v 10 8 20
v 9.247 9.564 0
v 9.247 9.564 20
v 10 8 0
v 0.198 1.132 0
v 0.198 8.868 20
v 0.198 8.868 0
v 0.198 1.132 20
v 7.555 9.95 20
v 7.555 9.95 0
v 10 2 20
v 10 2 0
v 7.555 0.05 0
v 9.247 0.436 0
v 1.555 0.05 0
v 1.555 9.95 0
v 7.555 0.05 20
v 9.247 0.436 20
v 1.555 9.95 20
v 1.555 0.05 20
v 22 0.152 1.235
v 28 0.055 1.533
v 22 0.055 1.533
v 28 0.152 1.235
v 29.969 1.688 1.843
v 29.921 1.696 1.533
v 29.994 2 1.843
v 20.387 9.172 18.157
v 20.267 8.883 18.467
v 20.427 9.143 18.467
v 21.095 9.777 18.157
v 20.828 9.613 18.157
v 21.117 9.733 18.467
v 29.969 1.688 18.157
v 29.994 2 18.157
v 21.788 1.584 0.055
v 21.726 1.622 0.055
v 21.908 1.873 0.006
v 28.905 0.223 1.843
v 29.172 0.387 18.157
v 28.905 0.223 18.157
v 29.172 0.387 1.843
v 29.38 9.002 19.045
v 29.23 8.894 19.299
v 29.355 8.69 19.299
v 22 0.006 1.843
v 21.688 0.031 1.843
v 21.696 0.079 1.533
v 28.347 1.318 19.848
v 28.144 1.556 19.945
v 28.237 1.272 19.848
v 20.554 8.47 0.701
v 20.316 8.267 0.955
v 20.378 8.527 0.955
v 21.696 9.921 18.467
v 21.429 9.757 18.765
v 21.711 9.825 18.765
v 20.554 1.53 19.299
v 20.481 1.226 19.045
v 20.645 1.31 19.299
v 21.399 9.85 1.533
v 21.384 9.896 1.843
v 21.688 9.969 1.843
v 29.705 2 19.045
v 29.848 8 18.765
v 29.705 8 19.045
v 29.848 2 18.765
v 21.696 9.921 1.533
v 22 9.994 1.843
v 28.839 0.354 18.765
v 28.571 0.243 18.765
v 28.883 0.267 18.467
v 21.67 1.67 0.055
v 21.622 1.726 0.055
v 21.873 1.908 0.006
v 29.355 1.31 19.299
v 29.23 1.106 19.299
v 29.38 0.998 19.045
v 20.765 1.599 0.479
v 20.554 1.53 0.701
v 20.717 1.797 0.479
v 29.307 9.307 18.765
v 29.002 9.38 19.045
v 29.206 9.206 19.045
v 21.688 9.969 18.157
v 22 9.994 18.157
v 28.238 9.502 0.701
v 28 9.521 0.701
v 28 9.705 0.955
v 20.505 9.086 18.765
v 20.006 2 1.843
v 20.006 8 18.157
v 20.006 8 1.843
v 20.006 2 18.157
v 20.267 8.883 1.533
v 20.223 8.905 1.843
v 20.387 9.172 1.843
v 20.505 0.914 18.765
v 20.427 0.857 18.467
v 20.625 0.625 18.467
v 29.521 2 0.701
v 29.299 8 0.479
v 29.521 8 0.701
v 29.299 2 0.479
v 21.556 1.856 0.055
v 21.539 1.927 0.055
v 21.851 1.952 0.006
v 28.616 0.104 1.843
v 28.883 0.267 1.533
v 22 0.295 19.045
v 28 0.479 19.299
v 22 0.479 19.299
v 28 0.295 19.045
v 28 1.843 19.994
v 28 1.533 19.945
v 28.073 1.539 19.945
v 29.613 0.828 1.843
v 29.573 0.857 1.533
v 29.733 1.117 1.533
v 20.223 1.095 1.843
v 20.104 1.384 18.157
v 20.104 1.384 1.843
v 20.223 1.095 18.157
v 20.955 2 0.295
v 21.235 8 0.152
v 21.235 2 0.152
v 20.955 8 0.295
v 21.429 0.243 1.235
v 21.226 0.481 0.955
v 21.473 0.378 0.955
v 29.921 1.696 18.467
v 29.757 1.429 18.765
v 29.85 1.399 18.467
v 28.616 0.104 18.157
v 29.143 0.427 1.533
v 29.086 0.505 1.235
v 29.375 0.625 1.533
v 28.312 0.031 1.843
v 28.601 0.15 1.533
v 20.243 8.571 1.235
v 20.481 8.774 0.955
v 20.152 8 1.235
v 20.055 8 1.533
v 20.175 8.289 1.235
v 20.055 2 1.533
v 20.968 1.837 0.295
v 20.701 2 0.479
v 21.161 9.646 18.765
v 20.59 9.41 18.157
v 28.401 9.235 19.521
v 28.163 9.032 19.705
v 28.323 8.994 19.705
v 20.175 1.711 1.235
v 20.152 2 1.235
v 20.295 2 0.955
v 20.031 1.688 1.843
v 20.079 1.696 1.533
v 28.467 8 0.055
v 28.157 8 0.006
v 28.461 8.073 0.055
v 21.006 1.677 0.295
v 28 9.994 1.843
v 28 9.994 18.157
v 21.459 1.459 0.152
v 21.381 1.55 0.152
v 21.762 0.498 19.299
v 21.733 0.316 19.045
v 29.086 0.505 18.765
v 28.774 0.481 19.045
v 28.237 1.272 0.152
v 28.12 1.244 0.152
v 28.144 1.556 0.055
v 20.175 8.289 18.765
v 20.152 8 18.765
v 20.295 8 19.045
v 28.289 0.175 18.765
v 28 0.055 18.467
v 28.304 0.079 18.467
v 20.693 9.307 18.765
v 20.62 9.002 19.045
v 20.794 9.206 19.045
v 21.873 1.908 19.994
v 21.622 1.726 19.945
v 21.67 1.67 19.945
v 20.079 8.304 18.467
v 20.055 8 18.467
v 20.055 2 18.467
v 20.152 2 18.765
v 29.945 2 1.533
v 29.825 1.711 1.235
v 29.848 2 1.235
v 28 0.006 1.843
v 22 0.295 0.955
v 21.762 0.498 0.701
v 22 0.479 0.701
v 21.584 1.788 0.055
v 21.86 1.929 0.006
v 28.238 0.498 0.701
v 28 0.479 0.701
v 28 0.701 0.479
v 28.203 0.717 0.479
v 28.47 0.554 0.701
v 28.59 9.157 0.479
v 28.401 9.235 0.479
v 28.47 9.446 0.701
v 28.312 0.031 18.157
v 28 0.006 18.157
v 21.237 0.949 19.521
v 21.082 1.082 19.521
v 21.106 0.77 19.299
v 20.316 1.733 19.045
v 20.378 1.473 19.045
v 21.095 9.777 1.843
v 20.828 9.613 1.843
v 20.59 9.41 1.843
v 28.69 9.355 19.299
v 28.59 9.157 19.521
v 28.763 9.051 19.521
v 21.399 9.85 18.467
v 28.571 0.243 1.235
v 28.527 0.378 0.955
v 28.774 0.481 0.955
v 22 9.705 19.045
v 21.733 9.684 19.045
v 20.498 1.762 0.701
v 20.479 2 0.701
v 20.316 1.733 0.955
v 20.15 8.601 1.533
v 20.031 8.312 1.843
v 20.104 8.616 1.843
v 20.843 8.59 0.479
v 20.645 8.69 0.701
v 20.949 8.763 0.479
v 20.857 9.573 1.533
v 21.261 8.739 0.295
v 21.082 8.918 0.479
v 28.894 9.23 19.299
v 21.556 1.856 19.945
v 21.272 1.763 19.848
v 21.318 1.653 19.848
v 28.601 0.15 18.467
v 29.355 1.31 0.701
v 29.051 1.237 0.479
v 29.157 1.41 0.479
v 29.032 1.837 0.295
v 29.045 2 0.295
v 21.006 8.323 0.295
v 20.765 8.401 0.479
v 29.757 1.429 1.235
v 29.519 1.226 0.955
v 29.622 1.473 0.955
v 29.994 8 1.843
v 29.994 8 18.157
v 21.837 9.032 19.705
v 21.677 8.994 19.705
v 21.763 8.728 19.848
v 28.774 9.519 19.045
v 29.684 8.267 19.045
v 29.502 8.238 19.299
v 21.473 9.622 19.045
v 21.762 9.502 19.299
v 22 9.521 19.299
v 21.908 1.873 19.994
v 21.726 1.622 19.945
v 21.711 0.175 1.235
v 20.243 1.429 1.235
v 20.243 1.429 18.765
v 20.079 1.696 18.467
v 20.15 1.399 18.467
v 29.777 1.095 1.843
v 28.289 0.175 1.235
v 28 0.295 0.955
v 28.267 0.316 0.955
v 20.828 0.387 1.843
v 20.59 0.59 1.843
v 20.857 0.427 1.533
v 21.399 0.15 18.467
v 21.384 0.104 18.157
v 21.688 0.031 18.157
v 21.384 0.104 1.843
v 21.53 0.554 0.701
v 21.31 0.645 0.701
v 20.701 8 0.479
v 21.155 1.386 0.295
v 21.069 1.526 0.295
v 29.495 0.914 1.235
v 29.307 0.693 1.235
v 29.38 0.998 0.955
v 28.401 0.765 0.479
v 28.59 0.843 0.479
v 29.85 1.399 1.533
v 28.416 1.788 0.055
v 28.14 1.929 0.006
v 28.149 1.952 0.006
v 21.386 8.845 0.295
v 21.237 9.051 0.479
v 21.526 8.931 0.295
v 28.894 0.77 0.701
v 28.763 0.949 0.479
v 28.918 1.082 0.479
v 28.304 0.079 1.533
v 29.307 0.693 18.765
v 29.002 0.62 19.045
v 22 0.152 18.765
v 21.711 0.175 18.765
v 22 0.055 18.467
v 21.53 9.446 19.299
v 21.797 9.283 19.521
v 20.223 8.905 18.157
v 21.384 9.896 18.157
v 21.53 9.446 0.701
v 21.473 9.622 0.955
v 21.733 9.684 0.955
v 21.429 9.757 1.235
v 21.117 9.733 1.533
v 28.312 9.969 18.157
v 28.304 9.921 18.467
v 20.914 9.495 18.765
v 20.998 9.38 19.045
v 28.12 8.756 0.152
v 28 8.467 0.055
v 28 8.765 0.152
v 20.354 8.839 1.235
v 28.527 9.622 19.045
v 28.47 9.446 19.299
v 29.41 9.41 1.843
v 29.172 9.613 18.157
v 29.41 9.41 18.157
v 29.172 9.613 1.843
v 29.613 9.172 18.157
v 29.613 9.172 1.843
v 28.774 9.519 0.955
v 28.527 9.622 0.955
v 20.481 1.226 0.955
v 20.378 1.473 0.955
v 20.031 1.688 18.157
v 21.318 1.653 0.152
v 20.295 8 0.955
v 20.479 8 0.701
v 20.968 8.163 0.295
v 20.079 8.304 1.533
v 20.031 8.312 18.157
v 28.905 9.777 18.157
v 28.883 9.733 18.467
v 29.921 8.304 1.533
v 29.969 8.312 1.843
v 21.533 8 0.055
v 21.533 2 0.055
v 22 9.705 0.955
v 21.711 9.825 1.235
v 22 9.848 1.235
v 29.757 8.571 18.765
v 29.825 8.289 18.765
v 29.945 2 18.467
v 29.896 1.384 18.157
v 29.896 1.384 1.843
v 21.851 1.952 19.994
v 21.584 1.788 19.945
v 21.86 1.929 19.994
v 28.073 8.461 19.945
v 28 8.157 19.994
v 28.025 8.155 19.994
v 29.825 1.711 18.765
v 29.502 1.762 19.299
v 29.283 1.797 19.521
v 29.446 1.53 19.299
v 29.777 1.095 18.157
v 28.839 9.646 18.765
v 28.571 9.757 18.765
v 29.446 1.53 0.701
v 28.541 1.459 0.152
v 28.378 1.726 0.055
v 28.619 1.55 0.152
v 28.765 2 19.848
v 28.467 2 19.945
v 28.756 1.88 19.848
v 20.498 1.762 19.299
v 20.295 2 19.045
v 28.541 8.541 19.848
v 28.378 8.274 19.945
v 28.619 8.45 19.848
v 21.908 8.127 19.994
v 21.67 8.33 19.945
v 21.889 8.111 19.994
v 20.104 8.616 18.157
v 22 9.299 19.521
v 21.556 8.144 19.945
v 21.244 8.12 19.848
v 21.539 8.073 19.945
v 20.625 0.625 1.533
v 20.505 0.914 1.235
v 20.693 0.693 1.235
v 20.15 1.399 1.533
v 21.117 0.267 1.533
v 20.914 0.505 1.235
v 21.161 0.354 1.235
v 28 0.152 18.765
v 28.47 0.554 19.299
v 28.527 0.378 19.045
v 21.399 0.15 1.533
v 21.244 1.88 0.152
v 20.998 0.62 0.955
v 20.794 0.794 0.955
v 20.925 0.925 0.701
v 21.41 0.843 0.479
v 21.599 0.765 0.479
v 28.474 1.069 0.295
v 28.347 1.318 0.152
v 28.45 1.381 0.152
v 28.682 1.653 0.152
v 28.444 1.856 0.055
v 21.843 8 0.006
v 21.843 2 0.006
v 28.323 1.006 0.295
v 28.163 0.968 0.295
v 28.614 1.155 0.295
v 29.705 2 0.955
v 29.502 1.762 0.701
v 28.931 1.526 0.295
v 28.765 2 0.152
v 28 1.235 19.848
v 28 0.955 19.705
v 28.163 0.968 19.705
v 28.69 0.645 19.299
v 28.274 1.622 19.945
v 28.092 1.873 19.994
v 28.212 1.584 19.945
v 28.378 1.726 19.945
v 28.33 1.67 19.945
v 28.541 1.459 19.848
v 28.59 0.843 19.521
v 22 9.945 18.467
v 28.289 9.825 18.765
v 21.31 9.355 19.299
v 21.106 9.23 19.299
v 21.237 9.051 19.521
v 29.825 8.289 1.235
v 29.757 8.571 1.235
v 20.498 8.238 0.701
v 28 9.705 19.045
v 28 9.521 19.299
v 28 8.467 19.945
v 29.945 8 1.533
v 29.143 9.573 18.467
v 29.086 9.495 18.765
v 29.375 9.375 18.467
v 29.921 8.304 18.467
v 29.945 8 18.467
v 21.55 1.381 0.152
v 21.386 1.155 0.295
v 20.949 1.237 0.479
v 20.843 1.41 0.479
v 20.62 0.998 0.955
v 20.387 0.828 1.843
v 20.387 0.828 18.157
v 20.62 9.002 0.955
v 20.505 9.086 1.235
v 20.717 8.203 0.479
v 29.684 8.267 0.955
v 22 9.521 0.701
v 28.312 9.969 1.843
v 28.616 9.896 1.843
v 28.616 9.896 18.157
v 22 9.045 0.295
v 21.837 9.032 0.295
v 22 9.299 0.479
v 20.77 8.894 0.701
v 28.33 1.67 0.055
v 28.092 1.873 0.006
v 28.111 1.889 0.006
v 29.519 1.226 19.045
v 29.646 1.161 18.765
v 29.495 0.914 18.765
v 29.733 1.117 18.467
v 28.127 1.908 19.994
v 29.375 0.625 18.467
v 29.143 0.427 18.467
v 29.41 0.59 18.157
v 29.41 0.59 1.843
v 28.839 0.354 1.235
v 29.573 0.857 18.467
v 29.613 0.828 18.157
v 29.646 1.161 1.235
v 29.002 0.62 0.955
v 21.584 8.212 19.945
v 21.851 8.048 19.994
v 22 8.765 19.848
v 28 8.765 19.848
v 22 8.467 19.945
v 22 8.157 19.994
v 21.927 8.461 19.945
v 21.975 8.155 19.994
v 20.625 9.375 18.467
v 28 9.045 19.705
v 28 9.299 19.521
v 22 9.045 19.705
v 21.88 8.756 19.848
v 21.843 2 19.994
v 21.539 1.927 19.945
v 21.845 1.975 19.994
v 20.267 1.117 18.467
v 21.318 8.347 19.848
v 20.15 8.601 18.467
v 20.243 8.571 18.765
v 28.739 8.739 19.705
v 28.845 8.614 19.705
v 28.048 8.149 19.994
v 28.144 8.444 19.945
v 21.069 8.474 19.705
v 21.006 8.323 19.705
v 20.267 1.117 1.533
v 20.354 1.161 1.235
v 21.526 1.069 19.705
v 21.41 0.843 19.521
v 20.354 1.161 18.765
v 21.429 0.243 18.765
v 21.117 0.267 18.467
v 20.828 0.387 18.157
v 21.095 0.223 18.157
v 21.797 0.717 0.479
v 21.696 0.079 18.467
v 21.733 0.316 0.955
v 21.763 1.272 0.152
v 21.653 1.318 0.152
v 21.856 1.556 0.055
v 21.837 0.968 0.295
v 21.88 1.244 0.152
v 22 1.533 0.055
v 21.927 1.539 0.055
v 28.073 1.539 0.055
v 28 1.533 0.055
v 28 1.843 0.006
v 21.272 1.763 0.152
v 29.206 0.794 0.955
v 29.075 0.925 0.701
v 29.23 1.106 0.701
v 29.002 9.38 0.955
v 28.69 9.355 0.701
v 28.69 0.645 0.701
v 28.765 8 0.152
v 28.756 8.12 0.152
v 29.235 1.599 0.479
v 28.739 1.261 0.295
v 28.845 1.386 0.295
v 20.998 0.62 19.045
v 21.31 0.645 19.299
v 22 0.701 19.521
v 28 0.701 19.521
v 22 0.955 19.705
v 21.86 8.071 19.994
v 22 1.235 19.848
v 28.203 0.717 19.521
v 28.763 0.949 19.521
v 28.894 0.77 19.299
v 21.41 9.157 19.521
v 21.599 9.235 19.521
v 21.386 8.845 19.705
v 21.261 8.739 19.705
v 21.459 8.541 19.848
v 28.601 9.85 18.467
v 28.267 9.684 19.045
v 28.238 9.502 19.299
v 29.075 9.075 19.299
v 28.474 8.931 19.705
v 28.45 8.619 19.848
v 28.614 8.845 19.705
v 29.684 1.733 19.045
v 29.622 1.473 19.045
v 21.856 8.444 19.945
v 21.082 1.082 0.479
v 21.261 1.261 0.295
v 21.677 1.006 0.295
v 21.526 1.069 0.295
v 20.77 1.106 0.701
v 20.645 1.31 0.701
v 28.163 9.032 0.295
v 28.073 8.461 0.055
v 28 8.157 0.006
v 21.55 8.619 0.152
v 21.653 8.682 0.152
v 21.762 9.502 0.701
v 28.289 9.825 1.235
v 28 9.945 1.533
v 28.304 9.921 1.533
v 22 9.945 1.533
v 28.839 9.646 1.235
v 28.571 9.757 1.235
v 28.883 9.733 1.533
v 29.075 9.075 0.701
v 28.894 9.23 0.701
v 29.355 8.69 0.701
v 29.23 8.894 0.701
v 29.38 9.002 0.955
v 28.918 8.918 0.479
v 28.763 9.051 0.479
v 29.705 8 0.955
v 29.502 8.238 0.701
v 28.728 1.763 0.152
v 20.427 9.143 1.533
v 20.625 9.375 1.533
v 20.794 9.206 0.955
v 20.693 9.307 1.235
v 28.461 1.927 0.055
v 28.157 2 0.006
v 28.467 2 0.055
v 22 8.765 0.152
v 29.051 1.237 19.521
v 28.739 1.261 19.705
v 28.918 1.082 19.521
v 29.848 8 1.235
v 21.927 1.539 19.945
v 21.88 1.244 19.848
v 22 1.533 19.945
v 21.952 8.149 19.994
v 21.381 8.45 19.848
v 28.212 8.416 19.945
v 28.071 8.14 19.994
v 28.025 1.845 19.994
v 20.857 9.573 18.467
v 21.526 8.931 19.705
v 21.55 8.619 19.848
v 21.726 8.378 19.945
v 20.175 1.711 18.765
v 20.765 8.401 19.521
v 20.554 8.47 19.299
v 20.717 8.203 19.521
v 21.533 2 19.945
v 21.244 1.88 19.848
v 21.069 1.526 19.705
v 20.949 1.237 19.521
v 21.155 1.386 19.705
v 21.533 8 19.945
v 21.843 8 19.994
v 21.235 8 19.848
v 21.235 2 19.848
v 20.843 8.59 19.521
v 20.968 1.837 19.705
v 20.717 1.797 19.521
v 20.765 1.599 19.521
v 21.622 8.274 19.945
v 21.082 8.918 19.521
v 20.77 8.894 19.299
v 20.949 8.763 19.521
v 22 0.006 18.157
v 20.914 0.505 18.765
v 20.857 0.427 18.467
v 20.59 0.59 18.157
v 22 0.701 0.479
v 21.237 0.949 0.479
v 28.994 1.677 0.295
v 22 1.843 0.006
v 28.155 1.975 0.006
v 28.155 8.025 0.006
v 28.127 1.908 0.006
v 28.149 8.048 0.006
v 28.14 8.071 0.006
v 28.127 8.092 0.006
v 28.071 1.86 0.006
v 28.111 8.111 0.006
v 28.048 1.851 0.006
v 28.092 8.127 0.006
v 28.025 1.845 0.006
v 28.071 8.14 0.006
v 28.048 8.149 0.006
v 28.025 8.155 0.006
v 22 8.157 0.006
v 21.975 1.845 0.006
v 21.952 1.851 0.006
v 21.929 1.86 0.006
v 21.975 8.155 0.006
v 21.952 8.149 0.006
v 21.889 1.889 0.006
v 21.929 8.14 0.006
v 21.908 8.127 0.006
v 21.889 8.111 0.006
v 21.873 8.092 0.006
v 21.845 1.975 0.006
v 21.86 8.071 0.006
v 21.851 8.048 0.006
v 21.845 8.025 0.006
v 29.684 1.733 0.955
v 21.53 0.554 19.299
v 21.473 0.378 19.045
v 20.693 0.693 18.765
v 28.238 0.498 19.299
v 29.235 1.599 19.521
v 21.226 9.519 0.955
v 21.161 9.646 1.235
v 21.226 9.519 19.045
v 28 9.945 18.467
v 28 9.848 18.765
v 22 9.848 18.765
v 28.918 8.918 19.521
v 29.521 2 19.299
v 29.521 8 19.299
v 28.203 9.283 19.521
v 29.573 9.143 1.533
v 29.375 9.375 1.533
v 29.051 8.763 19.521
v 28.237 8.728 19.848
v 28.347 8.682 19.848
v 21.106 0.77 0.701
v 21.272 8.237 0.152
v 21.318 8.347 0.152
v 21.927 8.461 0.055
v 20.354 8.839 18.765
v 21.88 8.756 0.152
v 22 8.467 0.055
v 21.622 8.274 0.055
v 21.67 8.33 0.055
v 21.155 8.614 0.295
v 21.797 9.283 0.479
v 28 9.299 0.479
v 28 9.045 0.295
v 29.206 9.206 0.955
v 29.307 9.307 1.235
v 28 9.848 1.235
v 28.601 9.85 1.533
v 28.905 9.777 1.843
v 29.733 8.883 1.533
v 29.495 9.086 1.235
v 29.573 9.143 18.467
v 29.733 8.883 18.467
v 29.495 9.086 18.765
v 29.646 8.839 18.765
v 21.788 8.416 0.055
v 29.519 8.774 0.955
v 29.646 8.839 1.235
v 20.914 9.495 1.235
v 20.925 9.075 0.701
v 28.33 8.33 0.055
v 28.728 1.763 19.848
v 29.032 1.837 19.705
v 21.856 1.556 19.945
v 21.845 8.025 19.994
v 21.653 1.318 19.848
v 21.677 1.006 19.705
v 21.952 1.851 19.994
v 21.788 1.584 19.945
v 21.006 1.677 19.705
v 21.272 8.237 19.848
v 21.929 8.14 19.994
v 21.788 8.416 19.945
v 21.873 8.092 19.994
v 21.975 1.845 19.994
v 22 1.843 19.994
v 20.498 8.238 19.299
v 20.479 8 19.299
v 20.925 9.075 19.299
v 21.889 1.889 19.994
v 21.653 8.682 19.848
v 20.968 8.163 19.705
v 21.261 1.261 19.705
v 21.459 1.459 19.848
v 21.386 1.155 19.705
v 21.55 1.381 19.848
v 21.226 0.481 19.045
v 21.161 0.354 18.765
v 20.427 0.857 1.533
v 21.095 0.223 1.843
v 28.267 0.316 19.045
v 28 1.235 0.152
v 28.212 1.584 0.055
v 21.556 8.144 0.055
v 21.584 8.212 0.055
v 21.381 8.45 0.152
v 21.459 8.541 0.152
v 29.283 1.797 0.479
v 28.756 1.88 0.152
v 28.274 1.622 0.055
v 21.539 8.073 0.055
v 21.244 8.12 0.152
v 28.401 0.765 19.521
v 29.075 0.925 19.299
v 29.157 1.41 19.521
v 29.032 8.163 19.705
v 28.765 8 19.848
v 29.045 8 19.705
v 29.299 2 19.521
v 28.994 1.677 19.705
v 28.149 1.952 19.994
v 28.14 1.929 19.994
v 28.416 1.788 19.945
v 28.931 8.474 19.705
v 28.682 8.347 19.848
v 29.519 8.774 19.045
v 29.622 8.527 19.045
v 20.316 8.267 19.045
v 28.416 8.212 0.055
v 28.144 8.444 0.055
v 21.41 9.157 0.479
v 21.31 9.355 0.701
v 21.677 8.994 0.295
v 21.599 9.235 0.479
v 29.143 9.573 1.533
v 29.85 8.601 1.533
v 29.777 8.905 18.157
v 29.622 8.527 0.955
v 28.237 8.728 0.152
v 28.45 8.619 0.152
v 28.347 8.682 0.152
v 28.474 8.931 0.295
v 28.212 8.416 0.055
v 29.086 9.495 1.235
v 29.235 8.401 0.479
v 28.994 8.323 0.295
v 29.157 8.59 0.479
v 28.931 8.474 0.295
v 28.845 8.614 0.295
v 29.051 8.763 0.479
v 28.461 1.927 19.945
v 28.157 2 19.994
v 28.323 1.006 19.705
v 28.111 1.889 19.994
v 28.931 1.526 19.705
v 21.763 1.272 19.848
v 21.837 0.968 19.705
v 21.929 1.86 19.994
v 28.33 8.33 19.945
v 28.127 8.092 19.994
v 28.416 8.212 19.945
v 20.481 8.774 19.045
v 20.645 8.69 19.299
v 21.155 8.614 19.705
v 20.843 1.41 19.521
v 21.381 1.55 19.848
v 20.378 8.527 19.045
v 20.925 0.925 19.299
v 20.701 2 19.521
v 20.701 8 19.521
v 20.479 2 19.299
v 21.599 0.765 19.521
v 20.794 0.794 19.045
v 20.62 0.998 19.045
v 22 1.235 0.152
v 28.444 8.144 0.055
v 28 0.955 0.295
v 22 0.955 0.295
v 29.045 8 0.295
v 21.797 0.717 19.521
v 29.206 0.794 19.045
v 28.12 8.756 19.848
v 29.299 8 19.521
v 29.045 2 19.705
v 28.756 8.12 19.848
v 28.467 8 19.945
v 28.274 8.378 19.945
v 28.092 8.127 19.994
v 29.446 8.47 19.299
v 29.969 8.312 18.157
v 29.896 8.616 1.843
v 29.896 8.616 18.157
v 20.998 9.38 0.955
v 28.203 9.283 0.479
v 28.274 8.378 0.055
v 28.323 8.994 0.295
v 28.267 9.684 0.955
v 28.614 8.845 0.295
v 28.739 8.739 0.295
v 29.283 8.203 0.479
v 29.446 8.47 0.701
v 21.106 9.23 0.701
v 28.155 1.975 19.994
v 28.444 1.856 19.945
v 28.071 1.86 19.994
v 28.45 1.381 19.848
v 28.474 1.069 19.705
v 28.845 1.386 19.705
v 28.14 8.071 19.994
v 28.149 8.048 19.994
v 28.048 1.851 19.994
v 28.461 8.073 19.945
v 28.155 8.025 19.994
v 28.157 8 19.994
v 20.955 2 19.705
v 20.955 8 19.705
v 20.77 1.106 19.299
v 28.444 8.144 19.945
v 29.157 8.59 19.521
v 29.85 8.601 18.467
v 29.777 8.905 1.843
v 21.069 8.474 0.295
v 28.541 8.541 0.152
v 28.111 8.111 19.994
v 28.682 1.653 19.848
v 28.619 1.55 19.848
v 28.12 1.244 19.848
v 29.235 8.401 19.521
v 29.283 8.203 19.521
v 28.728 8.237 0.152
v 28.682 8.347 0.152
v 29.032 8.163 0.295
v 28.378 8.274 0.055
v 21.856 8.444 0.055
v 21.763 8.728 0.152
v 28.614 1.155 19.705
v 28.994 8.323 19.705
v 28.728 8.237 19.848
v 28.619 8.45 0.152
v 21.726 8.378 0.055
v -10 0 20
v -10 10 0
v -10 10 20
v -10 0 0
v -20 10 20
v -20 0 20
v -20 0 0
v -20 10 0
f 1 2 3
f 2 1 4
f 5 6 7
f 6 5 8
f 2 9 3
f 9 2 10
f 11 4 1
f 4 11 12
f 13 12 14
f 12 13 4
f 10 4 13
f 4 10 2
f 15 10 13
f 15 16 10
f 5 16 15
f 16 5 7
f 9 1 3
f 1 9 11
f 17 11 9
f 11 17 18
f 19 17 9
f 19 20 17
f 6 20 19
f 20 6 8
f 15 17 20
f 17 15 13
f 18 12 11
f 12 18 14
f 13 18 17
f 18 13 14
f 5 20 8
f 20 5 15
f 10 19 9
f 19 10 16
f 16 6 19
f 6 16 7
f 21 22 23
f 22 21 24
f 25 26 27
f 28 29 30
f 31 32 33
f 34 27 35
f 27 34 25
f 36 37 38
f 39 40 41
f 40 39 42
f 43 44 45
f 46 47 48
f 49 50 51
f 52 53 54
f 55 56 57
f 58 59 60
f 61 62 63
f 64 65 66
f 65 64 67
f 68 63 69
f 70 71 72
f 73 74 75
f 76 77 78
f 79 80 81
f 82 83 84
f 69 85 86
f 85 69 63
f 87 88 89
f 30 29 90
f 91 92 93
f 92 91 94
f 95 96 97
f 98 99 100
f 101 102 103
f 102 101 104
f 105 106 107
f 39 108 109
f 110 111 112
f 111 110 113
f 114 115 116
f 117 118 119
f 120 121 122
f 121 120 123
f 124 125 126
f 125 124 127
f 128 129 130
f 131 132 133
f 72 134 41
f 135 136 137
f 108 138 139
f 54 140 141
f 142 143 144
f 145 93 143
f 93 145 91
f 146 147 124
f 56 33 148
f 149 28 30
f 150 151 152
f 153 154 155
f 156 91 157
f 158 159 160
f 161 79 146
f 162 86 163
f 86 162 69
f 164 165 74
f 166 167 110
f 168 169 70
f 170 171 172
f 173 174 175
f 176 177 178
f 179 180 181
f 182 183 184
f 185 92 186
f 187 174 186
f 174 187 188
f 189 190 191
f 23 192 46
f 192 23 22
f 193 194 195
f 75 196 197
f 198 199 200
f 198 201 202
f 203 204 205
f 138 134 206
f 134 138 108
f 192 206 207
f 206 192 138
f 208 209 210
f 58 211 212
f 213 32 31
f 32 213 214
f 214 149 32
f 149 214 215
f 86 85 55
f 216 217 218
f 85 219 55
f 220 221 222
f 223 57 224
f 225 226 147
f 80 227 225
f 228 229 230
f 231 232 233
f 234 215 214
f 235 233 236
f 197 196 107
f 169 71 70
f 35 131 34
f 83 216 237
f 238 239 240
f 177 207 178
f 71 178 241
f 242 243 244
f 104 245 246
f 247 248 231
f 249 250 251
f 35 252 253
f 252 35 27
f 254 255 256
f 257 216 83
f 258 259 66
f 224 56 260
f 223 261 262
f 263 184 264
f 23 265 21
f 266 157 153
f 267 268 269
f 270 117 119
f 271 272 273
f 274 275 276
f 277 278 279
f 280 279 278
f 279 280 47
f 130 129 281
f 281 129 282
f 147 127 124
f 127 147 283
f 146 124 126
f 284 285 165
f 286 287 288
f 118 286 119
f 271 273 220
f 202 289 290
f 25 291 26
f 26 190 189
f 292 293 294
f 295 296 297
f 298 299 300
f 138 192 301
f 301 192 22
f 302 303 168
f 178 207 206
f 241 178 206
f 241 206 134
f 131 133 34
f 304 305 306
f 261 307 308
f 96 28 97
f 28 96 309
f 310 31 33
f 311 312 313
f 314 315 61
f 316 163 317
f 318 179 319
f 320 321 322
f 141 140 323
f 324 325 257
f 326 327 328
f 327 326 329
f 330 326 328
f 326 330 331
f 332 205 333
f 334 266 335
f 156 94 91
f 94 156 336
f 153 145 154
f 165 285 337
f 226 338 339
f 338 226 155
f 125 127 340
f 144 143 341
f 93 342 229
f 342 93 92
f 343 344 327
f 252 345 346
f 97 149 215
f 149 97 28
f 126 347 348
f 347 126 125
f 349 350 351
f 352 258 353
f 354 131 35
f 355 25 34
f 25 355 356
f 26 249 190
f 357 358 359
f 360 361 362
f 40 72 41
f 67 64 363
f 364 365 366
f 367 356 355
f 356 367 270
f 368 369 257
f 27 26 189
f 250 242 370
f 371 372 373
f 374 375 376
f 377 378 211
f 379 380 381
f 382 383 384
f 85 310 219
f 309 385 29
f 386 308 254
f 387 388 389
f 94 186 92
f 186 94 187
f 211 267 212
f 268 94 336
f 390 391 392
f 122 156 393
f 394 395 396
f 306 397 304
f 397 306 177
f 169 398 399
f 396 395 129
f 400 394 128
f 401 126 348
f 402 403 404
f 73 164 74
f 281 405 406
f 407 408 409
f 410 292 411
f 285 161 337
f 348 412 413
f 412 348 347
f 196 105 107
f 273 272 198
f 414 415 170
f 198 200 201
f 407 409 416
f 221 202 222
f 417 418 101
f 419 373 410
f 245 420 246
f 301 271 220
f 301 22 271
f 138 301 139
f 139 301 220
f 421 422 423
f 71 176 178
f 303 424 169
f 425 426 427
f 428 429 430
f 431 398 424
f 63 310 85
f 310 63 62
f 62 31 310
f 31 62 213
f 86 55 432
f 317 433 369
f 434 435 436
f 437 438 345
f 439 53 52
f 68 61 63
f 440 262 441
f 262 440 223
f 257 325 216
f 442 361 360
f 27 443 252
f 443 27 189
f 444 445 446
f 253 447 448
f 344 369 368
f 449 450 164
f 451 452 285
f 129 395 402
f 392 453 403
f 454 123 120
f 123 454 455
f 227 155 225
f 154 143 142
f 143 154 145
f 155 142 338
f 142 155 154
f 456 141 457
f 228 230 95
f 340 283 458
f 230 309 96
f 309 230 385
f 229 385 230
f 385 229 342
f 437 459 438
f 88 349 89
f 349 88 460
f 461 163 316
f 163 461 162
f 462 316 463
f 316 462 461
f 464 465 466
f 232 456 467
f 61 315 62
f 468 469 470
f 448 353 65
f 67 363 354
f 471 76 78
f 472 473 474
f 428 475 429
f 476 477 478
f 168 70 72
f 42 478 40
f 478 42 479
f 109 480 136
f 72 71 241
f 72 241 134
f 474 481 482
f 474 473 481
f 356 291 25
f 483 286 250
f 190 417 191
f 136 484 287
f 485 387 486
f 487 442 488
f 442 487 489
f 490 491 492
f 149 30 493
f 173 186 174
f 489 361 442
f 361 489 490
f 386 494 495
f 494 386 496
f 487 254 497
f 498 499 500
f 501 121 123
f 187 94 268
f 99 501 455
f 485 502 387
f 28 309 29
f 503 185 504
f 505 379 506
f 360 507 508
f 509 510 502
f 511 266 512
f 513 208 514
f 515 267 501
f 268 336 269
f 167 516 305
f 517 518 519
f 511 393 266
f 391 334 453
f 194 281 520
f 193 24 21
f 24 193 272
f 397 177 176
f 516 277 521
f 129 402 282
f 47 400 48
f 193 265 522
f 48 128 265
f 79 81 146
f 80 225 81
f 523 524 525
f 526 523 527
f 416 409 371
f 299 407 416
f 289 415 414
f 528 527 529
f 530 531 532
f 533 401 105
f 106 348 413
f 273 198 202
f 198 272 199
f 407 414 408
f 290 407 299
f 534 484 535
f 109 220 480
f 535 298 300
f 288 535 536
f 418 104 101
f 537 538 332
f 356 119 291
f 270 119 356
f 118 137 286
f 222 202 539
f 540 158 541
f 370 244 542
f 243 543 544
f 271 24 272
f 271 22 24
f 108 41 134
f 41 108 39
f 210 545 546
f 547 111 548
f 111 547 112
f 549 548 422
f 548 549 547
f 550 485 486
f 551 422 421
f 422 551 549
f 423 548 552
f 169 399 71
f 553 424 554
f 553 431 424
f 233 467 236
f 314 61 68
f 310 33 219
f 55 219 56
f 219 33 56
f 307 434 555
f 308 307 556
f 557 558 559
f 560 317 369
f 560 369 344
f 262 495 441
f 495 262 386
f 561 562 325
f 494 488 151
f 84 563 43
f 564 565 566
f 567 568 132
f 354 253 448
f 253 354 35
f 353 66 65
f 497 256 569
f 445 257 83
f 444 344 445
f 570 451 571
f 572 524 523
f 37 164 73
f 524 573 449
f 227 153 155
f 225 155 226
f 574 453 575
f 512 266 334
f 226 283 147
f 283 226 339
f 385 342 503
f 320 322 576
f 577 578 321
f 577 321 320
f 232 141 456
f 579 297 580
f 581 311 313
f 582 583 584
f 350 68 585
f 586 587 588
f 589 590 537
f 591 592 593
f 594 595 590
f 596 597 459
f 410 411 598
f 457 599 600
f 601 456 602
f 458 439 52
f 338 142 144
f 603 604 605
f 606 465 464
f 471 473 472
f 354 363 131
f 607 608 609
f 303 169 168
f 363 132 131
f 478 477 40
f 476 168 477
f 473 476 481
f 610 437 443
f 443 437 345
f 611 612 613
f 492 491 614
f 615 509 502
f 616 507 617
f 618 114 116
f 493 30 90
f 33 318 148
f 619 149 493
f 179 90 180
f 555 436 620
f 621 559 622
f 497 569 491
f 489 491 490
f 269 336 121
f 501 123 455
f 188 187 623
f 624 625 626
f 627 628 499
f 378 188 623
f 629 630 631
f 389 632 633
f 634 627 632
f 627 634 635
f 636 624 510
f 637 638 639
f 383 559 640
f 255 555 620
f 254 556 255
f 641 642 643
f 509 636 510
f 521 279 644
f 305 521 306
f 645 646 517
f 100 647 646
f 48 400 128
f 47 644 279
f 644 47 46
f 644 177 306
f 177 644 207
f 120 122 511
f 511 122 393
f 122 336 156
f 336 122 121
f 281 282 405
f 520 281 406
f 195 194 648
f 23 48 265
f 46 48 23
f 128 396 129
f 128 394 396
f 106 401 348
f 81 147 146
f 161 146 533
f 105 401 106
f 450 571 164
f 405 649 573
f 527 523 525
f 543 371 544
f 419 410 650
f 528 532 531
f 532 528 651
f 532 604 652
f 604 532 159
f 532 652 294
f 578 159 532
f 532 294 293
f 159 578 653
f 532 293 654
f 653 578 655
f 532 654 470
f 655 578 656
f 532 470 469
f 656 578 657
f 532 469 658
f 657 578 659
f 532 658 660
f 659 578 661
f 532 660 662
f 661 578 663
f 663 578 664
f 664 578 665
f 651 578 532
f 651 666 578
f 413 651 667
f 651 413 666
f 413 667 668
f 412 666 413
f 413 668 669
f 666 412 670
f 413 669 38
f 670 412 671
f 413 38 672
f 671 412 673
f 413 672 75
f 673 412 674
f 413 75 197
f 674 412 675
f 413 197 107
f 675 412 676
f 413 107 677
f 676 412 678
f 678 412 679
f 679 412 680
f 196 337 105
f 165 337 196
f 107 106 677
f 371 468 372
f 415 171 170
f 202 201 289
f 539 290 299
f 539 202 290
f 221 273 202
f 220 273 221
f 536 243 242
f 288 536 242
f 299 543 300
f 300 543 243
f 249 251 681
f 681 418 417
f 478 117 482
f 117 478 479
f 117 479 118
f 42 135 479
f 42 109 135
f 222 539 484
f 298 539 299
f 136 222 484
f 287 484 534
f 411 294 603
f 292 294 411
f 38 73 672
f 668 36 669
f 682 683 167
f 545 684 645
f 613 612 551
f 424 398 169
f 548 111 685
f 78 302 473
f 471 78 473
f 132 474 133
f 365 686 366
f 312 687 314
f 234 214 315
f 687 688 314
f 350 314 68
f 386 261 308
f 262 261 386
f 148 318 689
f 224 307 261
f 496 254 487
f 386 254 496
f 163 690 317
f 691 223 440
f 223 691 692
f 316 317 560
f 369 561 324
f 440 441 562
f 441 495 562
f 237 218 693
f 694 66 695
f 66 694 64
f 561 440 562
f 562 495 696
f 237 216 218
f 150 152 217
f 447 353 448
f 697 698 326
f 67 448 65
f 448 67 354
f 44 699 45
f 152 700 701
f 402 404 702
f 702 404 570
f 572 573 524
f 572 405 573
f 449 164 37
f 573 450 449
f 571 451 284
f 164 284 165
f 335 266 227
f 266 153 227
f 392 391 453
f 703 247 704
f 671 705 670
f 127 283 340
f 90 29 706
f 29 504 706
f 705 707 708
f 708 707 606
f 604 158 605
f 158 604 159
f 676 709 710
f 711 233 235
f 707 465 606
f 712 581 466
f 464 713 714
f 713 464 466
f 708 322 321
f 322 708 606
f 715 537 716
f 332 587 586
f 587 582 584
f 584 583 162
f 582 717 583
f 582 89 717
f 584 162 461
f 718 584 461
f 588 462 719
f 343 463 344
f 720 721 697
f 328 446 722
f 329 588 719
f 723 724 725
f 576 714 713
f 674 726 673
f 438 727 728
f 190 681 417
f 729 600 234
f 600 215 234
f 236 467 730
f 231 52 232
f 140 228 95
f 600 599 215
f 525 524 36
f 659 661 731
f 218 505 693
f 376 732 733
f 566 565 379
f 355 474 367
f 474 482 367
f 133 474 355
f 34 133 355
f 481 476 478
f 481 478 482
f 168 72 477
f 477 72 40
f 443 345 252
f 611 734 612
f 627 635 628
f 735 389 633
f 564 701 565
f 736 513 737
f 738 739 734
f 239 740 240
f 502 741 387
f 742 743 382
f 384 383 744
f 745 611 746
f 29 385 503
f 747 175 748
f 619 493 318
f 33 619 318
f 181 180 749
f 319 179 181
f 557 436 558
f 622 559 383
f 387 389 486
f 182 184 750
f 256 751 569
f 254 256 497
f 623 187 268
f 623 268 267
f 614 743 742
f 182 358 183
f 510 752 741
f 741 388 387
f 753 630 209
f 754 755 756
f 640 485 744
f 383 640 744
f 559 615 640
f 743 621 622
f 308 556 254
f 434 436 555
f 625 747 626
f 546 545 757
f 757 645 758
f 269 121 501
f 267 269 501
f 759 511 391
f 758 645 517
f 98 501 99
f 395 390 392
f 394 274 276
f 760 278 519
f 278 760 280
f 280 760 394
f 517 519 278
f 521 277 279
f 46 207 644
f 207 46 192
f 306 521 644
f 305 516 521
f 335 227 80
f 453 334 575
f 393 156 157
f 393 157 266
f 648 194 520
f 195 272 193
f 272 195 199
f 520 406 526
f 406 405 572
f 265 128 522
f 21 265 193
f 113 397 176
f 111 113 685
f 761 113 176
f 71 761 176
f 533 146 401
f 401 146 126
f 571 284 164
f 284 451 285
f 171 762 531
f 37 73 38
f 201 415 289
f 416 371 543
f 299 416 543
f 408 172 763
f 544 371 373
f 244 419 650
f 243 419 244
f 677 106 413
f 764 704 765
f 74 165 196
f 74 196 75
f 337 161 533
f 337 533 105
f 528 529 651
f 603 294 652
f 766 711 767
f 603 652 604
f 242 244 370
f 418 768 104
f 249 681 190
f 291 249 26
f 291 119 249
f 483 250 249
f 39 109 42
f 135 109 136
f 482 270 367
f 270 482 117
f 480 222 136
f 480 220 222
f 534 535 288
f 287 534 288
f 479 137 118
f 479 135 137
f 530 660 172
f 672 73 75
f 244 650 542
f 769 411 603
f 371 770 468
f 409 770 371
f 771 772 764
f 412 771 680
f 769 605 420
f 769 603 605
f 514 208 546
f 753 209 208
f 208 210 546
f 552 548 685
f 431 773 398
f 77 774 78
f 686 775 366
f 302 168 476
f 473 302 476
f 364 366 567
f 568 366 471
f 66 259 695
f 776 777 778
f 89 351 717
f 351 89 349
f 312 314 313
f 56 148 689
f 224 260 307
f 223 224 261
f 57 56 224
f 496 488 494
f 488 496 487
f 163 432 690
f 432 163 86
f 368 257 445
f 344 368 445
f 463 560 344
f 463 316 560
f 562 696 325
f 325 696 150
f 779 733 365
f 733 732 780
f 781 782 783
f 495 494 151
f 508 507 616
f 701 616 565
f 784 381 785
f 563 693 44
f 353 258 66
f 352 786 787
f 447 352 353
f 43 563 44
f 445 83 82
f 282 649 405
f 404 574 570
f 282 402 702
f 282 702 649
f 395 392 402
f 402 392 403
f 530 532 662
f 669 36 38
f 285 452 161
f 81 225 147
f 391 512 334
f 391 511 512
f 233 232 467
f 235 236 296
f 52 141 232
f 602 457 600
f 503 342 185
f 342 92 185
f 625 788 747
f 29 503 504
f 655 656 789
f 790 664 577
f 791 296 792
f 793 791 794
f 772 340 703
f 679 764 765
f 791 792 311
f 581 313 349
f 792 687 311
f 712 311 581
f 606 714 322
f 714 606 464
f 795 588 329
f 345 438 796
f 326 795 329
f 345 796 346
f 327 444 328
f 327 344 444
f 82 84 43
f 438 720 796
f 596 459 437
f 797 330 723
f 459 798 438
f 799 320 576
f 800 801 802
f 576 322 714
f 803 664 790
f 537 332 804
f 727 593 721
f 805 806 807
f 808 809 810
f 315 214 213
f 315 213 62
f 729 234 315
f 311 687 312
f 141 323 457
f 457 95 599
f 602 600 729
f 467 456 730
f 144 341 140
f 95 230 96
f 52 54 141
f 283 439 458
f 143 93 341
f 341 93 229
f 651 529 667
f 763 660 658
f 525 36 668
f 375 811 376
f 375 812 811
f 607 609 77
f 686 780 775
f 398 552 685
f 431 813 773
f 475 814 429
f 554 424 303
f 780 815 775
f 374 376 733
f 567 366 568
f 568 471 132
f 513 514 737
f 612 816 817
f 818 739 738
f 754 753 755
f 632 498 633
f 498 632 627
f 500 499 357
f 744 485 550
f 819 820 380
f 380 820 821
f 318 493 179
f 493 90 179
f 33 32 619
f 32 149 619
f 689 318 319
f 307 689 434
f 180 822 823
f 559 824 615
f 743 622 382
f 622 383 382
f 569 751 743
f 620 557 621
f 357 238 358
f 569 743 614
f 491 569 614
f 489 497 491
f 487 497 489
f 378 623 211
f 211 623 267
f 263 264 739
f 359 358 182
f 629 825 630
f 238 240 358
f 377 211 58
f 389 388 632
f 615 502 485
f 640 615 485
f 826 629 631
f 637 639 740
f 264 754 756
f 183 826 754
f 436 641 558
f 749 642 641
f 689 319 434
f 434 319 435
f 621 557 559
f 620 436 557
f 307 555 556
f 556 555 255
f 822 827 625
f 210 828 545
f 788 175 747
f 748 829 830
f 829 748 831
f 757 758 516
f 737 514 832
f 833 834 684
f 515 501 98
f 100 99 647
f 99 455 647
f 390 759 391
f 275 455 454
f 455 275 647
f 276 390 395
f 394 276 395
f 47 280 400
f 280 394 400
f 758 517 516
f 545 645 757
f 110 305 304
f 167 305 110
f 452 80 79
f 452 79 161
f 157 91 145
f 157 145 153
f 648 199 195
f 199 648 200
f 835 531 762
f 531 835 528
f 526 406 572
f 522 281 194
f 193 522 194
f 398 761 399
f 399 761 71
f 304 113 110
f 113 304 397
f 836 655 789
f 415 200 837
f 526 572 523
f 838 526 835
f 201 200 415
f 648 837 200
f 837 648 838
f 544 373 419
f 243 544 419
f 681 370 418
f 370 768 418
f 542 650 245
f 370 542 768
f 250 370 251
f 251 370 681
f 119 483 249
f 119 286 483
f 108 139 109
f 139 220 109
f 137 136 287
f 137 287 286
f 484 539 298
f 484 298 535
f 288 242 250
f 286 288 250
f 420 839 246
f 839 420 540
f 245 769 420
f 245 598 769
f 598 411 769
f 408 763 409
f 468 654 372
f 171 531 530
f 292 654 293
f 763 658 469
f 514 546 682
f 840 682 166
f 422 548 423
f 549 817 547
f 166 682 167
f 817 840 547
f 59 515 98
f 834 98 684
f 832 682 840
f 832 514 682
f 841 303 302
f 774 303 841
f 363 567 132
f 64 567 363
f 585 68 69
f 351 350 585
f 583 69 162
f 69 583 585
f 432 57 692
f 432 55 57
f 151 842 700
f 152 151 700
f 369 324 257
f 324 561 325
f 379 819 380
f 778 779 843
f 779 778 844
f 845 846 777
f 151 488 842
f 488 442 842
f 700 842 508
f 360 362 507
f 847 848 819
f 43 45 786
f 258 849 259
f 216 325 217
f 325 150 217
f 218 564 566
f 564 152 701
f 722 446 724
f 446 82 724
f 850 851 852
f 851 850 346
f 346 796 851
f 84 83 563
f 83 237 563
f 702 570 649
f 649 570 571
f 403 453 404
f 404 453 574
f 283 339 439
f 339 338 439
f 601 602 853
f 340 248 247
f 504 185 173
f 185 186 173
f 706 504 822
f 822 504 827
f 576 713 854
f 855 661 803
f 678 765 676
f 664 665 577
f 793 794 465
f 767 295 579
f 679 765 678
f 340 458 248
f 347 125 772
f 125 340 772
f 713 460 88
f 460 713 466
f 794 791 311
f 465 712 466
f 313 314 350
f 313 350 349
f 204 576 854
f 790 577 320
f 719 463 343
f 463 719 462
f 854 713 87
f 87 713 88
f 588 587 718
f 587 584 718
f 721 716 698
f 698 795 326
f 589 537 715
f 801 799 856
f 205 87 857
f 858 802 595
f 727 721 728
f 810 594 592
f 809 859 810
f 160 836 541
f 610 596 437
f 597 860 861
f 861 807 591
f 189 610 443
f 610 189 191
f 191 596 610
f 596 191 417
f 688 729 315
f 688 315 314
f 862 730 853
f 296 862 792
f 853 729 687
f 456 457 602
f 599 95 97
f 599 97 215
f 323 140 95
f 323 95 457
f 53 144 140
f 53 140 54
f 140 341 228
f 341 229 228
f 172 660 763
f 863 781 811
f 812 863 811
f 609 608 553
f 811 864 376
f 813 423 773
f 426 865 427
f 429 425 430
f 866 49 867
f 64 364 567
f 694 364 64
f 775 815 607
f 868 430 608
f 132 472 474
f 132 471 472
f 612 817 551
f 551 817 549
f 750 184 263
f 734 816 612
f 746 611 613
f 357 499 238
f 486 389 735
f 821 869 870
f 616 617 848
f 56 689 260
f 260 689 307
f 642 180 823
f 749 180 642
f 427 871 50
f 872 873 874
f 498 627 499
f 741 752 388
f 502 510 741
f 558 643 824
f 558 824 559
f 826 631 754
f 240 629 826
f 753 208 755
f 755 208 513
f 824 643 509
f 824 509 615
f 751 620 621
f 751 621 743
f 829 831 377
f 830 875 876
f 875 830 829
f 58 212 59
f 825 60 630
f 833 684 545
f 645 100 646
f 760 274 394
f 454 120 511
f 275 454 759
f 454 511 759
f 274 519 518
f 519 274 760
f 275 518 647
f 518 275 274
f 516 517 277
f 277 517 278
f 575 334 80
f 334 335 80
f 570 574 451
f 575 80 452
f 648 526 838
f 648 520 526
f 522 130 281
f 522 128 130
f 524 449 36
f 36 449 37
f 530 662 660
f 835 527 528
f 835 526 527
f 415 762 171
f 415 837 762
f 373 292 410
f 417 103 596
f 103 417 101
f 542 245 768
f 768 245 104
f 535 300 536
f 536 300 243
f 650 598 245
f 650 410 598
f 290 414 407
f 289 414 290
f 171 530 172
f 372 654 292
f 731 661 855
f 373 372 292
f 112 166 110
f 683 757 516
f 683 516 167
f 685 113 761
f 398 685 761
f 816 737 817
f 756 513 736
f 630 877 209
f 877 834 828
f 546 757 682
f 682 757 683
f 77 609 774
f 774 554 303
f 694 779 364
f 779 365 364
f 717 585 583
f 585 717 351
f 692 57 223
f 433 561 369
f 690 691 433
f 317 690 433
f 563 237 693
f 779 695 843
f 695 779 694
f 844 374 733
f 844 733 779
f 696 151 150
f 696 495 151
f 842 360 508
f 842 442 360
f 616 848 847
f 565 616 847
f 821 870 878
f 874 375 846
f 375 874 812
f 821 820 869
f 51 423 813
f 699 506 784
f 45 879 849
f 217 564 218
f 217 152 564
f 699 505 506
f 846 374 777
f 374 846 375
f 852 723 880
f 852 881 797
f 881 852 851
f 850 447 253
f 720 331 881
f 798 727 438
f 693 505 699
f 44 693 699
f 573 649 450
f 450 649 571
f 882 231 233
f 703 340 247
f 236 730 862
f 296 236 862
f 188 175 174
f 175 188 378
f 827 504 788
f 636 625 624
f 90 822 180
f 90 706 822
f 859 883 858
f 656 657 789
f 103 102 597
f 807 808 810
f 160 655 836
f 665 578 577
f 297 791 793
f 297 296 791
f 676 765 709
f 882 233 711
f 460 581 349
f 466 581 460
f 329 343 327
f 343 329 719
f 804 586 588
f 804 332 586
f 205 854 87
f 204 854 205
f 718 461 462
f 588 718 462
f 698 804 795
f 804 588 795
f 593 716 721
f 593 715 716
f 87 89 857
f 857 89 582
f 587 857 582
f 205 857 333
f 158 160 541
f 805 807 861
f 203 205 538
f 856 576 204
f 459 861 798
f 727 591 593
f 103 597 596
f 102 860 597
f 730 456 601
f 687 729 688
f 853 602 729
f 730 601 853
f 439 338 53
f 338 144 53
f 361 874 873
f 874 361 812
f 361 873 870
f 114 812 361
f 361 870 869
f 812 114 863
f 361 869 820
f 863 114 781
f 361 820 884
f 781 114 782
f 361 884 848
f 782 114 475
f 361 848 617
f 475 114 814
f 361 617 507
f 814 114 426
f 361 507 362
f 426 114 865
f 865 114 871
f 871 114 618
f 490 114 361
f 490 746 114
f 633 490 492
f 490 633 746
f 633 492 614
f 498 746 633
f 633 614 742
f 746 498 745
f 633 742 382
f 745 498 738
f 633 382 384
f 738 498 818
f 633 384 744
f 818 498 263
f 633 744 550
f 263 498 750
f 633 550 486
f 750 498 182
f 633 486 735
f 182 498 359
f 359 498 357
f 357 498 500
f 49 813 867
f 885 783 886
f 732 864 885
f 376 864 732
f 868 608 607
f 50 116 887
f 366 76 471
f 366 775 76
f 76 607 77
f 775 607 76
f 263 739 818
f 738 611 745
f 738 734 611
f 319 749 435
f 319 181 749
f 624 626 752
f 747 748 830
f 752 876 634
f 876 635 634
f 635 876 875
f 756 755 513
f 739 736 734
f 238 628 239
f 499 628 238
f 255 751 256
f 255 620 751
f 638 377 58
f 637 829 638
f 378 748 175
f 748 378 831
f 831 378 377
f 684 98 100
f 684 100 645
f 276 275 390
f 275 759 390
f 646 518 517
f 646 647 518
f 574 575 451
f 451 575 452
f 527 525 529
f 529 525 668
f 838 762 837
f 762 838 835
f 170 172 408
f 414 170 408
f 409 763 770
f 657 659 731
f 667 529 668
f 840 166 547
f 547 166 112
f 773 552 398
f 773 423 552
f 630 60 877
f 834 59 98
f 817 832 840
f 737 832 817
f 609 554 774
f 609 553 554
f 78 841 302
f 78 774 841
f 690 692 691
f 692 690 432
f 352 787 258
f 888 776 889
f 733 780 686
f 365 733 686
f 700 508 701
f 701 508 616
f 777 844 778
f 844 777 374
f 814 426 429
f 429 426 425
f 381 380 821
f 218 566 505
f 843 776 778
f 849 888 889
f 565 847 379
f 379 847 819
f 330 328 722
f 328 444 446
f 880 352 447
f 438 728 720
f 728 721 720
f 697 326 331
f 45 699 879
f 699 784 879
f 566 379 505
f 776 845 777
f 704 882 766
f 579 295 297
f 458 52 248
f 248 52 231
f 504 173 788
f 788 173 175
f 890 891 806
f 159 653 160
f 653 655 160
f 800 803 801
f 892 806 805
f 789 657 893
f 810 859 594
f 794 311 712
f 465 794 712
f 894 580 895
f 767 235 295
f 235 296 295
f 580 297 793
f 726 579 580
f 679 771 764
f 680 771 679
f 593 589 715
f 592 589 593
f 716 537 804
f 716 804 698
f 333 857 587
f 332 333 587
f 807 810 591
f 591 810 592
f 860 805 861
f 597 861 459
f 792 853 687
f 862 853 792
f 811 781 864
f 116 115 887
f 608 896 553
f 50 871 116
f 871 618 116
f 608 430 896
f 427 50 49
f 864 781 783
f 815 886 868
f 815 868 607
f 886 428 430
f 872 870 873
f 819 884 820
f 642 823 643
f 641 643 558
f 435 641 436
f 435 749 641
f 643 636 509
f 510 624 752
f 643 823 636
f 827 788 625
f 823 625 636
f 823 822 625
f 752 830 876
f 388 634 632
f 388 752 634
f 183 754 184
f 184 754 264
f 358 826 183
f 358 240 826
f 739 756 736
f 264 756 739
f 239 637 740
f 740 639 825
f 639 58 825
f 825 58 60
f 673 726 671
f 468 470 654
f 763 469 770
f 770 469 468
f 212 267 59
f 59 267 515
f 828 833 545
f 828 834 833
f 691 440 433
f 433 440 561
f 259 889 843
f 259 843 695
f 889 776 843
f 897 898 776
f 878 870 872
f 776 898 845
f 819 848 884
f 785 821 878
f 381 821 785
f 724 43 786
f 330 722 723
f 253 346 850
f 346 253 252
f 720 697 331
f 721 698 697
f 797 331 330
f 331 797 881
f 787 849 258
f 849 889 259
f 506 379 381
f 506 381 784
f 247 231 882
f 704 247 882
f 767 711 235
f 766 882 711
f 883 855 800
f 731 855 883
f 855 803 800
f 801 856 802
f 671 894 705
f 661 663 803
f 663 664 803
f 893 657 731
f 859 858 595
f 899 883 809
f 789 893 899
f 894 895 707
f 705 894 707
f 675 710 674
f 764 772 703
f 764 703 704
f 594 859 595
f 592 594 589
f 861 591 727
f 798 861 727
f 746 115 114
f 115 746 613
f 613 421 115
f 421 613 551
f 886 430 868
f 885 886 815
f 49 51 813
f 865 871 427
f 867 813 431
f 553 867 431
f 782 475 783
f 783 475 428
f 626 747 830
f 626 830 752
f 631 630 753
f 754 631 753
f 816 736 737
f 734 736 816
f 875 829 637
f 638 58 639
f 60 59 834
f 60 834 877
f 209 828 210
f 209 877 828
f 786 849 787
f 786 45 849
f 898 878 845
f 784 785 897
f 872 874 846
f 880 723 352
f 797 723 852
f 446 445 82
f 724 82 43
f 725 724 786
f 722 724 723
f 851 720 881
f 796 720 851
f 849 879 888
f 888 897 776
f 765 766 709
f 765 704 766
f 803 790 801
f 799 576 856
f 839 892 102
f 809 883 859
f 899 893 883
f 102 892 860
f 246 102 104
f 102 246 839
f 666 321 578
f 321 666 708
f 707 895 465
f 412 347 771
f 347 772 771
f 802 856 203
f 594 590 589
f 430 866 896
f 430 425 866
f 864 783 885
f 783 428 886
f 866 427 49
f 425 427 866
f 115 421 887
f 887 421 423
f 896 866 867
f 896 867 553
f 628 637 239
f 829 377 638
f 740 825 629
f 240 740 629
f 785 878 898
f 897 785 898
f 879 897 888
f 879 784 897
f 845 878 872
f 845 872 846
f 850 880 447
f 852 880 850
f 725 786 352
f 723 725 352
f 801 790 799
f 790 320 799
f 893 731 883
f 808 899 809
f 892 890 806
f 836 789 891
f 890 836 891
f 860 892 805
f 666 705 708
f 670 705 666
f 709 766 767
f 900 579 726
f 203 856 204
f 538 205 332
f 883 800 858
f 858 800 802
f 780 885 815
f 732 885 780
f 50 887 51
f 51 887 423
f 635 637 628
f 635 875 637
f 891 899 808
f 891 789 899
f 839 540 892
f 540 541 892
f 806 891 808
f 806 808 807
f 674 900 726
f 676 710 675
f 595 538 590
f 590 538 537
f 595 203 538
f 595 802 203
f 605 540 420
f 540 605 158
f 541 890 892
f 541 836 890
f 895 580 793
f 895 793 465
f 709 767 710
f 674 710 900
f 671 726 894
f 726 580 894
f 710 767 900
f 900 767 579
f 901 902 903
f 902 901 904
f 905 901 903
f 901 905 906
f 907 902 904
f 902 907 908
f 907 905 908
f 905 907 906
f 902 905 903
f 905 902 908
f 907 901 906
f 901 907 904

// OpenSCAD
// file: params.scad
module roundedRect(size, radius)
    {
    x = size[0];
    y = size[1];
    z = size[2];

    linear_extrude(height=z)
    hull()
    {
        // place 4 circles in the corners, with the given radius
        translate([radius, radius, 0])
        circle(r=radius);

        translate([x - radius, radius, 0])
        circle(r=radius);

        translate([radius, y - radius, 0])
        circle(r=radius);

        translate([x - radius, y - radius, 0])
        circle(r=radius);
    }
}

module roundedPoly(size, radius)
{
	x = size[0];
	y = size[1];
	z = size[2];

	hull()
	{
		// place 4 circles in the bottom corners, with the given radius
		translate([radius, radius, radius])
		sphere(r=radius);
	
		translate([x - radius, radius, radius])
		sphere(r=radius);
	
		translate([radius, y - radius, radius])
		sphere(r=radius);
	
		translate([x - radius, y - radius, radius])
		sphere(r=radius);
        
        // place 4 circles in the top corners, with the given radius
		translate([radius, radius, z - radius])
		sphere(r=radius);
	
		translate([x - radius, radius, z - radius])
		sphere(r=radius);
	
		translate([radius, y - radius, z - radius])
		sphere(r=radius);
	
		translate([x - radius, y - radius, z - radius])
		sphere(r=radius);
	}
}

module standoff(radius, height, inner_radius, depth=10) {
    difference() {
        cylinder(h=height, r=radius, $fn=40);
        translate([0, 0, height-20]) {
            cylinder(h=20.1, r=inner_radius, $fn=40);
        }
    }
}
    

left_margin = 10;
right_margin = 40;
top_margin = 25;
bottom_margin = 12;
screen_width = 118.1;
screen_height = 70.9;
height = 2;

total_width = left_margin+right_margin+screen_width;
total_height = top_margin+bottom_margin+screen_height;

ribbon_cable_width=13;

wall_thickness = 2;
depth = 45;
standoff_od = 4;

camera_offset_x = 100;
camera_offset_y = 12;
camera_standoff_height = 4.7;

sensor_offset_x = 135;
sensor_offset_y = 15;
// main file
include <params.scad>

roundedRect([10, 10, 20], 2);

translate([20, 0, 0]) {
roundedPoly([10, 10, 20], 2, $fn=40); }

translate([-20, 0, 0]) {
cube([10, 10, 20]); }
